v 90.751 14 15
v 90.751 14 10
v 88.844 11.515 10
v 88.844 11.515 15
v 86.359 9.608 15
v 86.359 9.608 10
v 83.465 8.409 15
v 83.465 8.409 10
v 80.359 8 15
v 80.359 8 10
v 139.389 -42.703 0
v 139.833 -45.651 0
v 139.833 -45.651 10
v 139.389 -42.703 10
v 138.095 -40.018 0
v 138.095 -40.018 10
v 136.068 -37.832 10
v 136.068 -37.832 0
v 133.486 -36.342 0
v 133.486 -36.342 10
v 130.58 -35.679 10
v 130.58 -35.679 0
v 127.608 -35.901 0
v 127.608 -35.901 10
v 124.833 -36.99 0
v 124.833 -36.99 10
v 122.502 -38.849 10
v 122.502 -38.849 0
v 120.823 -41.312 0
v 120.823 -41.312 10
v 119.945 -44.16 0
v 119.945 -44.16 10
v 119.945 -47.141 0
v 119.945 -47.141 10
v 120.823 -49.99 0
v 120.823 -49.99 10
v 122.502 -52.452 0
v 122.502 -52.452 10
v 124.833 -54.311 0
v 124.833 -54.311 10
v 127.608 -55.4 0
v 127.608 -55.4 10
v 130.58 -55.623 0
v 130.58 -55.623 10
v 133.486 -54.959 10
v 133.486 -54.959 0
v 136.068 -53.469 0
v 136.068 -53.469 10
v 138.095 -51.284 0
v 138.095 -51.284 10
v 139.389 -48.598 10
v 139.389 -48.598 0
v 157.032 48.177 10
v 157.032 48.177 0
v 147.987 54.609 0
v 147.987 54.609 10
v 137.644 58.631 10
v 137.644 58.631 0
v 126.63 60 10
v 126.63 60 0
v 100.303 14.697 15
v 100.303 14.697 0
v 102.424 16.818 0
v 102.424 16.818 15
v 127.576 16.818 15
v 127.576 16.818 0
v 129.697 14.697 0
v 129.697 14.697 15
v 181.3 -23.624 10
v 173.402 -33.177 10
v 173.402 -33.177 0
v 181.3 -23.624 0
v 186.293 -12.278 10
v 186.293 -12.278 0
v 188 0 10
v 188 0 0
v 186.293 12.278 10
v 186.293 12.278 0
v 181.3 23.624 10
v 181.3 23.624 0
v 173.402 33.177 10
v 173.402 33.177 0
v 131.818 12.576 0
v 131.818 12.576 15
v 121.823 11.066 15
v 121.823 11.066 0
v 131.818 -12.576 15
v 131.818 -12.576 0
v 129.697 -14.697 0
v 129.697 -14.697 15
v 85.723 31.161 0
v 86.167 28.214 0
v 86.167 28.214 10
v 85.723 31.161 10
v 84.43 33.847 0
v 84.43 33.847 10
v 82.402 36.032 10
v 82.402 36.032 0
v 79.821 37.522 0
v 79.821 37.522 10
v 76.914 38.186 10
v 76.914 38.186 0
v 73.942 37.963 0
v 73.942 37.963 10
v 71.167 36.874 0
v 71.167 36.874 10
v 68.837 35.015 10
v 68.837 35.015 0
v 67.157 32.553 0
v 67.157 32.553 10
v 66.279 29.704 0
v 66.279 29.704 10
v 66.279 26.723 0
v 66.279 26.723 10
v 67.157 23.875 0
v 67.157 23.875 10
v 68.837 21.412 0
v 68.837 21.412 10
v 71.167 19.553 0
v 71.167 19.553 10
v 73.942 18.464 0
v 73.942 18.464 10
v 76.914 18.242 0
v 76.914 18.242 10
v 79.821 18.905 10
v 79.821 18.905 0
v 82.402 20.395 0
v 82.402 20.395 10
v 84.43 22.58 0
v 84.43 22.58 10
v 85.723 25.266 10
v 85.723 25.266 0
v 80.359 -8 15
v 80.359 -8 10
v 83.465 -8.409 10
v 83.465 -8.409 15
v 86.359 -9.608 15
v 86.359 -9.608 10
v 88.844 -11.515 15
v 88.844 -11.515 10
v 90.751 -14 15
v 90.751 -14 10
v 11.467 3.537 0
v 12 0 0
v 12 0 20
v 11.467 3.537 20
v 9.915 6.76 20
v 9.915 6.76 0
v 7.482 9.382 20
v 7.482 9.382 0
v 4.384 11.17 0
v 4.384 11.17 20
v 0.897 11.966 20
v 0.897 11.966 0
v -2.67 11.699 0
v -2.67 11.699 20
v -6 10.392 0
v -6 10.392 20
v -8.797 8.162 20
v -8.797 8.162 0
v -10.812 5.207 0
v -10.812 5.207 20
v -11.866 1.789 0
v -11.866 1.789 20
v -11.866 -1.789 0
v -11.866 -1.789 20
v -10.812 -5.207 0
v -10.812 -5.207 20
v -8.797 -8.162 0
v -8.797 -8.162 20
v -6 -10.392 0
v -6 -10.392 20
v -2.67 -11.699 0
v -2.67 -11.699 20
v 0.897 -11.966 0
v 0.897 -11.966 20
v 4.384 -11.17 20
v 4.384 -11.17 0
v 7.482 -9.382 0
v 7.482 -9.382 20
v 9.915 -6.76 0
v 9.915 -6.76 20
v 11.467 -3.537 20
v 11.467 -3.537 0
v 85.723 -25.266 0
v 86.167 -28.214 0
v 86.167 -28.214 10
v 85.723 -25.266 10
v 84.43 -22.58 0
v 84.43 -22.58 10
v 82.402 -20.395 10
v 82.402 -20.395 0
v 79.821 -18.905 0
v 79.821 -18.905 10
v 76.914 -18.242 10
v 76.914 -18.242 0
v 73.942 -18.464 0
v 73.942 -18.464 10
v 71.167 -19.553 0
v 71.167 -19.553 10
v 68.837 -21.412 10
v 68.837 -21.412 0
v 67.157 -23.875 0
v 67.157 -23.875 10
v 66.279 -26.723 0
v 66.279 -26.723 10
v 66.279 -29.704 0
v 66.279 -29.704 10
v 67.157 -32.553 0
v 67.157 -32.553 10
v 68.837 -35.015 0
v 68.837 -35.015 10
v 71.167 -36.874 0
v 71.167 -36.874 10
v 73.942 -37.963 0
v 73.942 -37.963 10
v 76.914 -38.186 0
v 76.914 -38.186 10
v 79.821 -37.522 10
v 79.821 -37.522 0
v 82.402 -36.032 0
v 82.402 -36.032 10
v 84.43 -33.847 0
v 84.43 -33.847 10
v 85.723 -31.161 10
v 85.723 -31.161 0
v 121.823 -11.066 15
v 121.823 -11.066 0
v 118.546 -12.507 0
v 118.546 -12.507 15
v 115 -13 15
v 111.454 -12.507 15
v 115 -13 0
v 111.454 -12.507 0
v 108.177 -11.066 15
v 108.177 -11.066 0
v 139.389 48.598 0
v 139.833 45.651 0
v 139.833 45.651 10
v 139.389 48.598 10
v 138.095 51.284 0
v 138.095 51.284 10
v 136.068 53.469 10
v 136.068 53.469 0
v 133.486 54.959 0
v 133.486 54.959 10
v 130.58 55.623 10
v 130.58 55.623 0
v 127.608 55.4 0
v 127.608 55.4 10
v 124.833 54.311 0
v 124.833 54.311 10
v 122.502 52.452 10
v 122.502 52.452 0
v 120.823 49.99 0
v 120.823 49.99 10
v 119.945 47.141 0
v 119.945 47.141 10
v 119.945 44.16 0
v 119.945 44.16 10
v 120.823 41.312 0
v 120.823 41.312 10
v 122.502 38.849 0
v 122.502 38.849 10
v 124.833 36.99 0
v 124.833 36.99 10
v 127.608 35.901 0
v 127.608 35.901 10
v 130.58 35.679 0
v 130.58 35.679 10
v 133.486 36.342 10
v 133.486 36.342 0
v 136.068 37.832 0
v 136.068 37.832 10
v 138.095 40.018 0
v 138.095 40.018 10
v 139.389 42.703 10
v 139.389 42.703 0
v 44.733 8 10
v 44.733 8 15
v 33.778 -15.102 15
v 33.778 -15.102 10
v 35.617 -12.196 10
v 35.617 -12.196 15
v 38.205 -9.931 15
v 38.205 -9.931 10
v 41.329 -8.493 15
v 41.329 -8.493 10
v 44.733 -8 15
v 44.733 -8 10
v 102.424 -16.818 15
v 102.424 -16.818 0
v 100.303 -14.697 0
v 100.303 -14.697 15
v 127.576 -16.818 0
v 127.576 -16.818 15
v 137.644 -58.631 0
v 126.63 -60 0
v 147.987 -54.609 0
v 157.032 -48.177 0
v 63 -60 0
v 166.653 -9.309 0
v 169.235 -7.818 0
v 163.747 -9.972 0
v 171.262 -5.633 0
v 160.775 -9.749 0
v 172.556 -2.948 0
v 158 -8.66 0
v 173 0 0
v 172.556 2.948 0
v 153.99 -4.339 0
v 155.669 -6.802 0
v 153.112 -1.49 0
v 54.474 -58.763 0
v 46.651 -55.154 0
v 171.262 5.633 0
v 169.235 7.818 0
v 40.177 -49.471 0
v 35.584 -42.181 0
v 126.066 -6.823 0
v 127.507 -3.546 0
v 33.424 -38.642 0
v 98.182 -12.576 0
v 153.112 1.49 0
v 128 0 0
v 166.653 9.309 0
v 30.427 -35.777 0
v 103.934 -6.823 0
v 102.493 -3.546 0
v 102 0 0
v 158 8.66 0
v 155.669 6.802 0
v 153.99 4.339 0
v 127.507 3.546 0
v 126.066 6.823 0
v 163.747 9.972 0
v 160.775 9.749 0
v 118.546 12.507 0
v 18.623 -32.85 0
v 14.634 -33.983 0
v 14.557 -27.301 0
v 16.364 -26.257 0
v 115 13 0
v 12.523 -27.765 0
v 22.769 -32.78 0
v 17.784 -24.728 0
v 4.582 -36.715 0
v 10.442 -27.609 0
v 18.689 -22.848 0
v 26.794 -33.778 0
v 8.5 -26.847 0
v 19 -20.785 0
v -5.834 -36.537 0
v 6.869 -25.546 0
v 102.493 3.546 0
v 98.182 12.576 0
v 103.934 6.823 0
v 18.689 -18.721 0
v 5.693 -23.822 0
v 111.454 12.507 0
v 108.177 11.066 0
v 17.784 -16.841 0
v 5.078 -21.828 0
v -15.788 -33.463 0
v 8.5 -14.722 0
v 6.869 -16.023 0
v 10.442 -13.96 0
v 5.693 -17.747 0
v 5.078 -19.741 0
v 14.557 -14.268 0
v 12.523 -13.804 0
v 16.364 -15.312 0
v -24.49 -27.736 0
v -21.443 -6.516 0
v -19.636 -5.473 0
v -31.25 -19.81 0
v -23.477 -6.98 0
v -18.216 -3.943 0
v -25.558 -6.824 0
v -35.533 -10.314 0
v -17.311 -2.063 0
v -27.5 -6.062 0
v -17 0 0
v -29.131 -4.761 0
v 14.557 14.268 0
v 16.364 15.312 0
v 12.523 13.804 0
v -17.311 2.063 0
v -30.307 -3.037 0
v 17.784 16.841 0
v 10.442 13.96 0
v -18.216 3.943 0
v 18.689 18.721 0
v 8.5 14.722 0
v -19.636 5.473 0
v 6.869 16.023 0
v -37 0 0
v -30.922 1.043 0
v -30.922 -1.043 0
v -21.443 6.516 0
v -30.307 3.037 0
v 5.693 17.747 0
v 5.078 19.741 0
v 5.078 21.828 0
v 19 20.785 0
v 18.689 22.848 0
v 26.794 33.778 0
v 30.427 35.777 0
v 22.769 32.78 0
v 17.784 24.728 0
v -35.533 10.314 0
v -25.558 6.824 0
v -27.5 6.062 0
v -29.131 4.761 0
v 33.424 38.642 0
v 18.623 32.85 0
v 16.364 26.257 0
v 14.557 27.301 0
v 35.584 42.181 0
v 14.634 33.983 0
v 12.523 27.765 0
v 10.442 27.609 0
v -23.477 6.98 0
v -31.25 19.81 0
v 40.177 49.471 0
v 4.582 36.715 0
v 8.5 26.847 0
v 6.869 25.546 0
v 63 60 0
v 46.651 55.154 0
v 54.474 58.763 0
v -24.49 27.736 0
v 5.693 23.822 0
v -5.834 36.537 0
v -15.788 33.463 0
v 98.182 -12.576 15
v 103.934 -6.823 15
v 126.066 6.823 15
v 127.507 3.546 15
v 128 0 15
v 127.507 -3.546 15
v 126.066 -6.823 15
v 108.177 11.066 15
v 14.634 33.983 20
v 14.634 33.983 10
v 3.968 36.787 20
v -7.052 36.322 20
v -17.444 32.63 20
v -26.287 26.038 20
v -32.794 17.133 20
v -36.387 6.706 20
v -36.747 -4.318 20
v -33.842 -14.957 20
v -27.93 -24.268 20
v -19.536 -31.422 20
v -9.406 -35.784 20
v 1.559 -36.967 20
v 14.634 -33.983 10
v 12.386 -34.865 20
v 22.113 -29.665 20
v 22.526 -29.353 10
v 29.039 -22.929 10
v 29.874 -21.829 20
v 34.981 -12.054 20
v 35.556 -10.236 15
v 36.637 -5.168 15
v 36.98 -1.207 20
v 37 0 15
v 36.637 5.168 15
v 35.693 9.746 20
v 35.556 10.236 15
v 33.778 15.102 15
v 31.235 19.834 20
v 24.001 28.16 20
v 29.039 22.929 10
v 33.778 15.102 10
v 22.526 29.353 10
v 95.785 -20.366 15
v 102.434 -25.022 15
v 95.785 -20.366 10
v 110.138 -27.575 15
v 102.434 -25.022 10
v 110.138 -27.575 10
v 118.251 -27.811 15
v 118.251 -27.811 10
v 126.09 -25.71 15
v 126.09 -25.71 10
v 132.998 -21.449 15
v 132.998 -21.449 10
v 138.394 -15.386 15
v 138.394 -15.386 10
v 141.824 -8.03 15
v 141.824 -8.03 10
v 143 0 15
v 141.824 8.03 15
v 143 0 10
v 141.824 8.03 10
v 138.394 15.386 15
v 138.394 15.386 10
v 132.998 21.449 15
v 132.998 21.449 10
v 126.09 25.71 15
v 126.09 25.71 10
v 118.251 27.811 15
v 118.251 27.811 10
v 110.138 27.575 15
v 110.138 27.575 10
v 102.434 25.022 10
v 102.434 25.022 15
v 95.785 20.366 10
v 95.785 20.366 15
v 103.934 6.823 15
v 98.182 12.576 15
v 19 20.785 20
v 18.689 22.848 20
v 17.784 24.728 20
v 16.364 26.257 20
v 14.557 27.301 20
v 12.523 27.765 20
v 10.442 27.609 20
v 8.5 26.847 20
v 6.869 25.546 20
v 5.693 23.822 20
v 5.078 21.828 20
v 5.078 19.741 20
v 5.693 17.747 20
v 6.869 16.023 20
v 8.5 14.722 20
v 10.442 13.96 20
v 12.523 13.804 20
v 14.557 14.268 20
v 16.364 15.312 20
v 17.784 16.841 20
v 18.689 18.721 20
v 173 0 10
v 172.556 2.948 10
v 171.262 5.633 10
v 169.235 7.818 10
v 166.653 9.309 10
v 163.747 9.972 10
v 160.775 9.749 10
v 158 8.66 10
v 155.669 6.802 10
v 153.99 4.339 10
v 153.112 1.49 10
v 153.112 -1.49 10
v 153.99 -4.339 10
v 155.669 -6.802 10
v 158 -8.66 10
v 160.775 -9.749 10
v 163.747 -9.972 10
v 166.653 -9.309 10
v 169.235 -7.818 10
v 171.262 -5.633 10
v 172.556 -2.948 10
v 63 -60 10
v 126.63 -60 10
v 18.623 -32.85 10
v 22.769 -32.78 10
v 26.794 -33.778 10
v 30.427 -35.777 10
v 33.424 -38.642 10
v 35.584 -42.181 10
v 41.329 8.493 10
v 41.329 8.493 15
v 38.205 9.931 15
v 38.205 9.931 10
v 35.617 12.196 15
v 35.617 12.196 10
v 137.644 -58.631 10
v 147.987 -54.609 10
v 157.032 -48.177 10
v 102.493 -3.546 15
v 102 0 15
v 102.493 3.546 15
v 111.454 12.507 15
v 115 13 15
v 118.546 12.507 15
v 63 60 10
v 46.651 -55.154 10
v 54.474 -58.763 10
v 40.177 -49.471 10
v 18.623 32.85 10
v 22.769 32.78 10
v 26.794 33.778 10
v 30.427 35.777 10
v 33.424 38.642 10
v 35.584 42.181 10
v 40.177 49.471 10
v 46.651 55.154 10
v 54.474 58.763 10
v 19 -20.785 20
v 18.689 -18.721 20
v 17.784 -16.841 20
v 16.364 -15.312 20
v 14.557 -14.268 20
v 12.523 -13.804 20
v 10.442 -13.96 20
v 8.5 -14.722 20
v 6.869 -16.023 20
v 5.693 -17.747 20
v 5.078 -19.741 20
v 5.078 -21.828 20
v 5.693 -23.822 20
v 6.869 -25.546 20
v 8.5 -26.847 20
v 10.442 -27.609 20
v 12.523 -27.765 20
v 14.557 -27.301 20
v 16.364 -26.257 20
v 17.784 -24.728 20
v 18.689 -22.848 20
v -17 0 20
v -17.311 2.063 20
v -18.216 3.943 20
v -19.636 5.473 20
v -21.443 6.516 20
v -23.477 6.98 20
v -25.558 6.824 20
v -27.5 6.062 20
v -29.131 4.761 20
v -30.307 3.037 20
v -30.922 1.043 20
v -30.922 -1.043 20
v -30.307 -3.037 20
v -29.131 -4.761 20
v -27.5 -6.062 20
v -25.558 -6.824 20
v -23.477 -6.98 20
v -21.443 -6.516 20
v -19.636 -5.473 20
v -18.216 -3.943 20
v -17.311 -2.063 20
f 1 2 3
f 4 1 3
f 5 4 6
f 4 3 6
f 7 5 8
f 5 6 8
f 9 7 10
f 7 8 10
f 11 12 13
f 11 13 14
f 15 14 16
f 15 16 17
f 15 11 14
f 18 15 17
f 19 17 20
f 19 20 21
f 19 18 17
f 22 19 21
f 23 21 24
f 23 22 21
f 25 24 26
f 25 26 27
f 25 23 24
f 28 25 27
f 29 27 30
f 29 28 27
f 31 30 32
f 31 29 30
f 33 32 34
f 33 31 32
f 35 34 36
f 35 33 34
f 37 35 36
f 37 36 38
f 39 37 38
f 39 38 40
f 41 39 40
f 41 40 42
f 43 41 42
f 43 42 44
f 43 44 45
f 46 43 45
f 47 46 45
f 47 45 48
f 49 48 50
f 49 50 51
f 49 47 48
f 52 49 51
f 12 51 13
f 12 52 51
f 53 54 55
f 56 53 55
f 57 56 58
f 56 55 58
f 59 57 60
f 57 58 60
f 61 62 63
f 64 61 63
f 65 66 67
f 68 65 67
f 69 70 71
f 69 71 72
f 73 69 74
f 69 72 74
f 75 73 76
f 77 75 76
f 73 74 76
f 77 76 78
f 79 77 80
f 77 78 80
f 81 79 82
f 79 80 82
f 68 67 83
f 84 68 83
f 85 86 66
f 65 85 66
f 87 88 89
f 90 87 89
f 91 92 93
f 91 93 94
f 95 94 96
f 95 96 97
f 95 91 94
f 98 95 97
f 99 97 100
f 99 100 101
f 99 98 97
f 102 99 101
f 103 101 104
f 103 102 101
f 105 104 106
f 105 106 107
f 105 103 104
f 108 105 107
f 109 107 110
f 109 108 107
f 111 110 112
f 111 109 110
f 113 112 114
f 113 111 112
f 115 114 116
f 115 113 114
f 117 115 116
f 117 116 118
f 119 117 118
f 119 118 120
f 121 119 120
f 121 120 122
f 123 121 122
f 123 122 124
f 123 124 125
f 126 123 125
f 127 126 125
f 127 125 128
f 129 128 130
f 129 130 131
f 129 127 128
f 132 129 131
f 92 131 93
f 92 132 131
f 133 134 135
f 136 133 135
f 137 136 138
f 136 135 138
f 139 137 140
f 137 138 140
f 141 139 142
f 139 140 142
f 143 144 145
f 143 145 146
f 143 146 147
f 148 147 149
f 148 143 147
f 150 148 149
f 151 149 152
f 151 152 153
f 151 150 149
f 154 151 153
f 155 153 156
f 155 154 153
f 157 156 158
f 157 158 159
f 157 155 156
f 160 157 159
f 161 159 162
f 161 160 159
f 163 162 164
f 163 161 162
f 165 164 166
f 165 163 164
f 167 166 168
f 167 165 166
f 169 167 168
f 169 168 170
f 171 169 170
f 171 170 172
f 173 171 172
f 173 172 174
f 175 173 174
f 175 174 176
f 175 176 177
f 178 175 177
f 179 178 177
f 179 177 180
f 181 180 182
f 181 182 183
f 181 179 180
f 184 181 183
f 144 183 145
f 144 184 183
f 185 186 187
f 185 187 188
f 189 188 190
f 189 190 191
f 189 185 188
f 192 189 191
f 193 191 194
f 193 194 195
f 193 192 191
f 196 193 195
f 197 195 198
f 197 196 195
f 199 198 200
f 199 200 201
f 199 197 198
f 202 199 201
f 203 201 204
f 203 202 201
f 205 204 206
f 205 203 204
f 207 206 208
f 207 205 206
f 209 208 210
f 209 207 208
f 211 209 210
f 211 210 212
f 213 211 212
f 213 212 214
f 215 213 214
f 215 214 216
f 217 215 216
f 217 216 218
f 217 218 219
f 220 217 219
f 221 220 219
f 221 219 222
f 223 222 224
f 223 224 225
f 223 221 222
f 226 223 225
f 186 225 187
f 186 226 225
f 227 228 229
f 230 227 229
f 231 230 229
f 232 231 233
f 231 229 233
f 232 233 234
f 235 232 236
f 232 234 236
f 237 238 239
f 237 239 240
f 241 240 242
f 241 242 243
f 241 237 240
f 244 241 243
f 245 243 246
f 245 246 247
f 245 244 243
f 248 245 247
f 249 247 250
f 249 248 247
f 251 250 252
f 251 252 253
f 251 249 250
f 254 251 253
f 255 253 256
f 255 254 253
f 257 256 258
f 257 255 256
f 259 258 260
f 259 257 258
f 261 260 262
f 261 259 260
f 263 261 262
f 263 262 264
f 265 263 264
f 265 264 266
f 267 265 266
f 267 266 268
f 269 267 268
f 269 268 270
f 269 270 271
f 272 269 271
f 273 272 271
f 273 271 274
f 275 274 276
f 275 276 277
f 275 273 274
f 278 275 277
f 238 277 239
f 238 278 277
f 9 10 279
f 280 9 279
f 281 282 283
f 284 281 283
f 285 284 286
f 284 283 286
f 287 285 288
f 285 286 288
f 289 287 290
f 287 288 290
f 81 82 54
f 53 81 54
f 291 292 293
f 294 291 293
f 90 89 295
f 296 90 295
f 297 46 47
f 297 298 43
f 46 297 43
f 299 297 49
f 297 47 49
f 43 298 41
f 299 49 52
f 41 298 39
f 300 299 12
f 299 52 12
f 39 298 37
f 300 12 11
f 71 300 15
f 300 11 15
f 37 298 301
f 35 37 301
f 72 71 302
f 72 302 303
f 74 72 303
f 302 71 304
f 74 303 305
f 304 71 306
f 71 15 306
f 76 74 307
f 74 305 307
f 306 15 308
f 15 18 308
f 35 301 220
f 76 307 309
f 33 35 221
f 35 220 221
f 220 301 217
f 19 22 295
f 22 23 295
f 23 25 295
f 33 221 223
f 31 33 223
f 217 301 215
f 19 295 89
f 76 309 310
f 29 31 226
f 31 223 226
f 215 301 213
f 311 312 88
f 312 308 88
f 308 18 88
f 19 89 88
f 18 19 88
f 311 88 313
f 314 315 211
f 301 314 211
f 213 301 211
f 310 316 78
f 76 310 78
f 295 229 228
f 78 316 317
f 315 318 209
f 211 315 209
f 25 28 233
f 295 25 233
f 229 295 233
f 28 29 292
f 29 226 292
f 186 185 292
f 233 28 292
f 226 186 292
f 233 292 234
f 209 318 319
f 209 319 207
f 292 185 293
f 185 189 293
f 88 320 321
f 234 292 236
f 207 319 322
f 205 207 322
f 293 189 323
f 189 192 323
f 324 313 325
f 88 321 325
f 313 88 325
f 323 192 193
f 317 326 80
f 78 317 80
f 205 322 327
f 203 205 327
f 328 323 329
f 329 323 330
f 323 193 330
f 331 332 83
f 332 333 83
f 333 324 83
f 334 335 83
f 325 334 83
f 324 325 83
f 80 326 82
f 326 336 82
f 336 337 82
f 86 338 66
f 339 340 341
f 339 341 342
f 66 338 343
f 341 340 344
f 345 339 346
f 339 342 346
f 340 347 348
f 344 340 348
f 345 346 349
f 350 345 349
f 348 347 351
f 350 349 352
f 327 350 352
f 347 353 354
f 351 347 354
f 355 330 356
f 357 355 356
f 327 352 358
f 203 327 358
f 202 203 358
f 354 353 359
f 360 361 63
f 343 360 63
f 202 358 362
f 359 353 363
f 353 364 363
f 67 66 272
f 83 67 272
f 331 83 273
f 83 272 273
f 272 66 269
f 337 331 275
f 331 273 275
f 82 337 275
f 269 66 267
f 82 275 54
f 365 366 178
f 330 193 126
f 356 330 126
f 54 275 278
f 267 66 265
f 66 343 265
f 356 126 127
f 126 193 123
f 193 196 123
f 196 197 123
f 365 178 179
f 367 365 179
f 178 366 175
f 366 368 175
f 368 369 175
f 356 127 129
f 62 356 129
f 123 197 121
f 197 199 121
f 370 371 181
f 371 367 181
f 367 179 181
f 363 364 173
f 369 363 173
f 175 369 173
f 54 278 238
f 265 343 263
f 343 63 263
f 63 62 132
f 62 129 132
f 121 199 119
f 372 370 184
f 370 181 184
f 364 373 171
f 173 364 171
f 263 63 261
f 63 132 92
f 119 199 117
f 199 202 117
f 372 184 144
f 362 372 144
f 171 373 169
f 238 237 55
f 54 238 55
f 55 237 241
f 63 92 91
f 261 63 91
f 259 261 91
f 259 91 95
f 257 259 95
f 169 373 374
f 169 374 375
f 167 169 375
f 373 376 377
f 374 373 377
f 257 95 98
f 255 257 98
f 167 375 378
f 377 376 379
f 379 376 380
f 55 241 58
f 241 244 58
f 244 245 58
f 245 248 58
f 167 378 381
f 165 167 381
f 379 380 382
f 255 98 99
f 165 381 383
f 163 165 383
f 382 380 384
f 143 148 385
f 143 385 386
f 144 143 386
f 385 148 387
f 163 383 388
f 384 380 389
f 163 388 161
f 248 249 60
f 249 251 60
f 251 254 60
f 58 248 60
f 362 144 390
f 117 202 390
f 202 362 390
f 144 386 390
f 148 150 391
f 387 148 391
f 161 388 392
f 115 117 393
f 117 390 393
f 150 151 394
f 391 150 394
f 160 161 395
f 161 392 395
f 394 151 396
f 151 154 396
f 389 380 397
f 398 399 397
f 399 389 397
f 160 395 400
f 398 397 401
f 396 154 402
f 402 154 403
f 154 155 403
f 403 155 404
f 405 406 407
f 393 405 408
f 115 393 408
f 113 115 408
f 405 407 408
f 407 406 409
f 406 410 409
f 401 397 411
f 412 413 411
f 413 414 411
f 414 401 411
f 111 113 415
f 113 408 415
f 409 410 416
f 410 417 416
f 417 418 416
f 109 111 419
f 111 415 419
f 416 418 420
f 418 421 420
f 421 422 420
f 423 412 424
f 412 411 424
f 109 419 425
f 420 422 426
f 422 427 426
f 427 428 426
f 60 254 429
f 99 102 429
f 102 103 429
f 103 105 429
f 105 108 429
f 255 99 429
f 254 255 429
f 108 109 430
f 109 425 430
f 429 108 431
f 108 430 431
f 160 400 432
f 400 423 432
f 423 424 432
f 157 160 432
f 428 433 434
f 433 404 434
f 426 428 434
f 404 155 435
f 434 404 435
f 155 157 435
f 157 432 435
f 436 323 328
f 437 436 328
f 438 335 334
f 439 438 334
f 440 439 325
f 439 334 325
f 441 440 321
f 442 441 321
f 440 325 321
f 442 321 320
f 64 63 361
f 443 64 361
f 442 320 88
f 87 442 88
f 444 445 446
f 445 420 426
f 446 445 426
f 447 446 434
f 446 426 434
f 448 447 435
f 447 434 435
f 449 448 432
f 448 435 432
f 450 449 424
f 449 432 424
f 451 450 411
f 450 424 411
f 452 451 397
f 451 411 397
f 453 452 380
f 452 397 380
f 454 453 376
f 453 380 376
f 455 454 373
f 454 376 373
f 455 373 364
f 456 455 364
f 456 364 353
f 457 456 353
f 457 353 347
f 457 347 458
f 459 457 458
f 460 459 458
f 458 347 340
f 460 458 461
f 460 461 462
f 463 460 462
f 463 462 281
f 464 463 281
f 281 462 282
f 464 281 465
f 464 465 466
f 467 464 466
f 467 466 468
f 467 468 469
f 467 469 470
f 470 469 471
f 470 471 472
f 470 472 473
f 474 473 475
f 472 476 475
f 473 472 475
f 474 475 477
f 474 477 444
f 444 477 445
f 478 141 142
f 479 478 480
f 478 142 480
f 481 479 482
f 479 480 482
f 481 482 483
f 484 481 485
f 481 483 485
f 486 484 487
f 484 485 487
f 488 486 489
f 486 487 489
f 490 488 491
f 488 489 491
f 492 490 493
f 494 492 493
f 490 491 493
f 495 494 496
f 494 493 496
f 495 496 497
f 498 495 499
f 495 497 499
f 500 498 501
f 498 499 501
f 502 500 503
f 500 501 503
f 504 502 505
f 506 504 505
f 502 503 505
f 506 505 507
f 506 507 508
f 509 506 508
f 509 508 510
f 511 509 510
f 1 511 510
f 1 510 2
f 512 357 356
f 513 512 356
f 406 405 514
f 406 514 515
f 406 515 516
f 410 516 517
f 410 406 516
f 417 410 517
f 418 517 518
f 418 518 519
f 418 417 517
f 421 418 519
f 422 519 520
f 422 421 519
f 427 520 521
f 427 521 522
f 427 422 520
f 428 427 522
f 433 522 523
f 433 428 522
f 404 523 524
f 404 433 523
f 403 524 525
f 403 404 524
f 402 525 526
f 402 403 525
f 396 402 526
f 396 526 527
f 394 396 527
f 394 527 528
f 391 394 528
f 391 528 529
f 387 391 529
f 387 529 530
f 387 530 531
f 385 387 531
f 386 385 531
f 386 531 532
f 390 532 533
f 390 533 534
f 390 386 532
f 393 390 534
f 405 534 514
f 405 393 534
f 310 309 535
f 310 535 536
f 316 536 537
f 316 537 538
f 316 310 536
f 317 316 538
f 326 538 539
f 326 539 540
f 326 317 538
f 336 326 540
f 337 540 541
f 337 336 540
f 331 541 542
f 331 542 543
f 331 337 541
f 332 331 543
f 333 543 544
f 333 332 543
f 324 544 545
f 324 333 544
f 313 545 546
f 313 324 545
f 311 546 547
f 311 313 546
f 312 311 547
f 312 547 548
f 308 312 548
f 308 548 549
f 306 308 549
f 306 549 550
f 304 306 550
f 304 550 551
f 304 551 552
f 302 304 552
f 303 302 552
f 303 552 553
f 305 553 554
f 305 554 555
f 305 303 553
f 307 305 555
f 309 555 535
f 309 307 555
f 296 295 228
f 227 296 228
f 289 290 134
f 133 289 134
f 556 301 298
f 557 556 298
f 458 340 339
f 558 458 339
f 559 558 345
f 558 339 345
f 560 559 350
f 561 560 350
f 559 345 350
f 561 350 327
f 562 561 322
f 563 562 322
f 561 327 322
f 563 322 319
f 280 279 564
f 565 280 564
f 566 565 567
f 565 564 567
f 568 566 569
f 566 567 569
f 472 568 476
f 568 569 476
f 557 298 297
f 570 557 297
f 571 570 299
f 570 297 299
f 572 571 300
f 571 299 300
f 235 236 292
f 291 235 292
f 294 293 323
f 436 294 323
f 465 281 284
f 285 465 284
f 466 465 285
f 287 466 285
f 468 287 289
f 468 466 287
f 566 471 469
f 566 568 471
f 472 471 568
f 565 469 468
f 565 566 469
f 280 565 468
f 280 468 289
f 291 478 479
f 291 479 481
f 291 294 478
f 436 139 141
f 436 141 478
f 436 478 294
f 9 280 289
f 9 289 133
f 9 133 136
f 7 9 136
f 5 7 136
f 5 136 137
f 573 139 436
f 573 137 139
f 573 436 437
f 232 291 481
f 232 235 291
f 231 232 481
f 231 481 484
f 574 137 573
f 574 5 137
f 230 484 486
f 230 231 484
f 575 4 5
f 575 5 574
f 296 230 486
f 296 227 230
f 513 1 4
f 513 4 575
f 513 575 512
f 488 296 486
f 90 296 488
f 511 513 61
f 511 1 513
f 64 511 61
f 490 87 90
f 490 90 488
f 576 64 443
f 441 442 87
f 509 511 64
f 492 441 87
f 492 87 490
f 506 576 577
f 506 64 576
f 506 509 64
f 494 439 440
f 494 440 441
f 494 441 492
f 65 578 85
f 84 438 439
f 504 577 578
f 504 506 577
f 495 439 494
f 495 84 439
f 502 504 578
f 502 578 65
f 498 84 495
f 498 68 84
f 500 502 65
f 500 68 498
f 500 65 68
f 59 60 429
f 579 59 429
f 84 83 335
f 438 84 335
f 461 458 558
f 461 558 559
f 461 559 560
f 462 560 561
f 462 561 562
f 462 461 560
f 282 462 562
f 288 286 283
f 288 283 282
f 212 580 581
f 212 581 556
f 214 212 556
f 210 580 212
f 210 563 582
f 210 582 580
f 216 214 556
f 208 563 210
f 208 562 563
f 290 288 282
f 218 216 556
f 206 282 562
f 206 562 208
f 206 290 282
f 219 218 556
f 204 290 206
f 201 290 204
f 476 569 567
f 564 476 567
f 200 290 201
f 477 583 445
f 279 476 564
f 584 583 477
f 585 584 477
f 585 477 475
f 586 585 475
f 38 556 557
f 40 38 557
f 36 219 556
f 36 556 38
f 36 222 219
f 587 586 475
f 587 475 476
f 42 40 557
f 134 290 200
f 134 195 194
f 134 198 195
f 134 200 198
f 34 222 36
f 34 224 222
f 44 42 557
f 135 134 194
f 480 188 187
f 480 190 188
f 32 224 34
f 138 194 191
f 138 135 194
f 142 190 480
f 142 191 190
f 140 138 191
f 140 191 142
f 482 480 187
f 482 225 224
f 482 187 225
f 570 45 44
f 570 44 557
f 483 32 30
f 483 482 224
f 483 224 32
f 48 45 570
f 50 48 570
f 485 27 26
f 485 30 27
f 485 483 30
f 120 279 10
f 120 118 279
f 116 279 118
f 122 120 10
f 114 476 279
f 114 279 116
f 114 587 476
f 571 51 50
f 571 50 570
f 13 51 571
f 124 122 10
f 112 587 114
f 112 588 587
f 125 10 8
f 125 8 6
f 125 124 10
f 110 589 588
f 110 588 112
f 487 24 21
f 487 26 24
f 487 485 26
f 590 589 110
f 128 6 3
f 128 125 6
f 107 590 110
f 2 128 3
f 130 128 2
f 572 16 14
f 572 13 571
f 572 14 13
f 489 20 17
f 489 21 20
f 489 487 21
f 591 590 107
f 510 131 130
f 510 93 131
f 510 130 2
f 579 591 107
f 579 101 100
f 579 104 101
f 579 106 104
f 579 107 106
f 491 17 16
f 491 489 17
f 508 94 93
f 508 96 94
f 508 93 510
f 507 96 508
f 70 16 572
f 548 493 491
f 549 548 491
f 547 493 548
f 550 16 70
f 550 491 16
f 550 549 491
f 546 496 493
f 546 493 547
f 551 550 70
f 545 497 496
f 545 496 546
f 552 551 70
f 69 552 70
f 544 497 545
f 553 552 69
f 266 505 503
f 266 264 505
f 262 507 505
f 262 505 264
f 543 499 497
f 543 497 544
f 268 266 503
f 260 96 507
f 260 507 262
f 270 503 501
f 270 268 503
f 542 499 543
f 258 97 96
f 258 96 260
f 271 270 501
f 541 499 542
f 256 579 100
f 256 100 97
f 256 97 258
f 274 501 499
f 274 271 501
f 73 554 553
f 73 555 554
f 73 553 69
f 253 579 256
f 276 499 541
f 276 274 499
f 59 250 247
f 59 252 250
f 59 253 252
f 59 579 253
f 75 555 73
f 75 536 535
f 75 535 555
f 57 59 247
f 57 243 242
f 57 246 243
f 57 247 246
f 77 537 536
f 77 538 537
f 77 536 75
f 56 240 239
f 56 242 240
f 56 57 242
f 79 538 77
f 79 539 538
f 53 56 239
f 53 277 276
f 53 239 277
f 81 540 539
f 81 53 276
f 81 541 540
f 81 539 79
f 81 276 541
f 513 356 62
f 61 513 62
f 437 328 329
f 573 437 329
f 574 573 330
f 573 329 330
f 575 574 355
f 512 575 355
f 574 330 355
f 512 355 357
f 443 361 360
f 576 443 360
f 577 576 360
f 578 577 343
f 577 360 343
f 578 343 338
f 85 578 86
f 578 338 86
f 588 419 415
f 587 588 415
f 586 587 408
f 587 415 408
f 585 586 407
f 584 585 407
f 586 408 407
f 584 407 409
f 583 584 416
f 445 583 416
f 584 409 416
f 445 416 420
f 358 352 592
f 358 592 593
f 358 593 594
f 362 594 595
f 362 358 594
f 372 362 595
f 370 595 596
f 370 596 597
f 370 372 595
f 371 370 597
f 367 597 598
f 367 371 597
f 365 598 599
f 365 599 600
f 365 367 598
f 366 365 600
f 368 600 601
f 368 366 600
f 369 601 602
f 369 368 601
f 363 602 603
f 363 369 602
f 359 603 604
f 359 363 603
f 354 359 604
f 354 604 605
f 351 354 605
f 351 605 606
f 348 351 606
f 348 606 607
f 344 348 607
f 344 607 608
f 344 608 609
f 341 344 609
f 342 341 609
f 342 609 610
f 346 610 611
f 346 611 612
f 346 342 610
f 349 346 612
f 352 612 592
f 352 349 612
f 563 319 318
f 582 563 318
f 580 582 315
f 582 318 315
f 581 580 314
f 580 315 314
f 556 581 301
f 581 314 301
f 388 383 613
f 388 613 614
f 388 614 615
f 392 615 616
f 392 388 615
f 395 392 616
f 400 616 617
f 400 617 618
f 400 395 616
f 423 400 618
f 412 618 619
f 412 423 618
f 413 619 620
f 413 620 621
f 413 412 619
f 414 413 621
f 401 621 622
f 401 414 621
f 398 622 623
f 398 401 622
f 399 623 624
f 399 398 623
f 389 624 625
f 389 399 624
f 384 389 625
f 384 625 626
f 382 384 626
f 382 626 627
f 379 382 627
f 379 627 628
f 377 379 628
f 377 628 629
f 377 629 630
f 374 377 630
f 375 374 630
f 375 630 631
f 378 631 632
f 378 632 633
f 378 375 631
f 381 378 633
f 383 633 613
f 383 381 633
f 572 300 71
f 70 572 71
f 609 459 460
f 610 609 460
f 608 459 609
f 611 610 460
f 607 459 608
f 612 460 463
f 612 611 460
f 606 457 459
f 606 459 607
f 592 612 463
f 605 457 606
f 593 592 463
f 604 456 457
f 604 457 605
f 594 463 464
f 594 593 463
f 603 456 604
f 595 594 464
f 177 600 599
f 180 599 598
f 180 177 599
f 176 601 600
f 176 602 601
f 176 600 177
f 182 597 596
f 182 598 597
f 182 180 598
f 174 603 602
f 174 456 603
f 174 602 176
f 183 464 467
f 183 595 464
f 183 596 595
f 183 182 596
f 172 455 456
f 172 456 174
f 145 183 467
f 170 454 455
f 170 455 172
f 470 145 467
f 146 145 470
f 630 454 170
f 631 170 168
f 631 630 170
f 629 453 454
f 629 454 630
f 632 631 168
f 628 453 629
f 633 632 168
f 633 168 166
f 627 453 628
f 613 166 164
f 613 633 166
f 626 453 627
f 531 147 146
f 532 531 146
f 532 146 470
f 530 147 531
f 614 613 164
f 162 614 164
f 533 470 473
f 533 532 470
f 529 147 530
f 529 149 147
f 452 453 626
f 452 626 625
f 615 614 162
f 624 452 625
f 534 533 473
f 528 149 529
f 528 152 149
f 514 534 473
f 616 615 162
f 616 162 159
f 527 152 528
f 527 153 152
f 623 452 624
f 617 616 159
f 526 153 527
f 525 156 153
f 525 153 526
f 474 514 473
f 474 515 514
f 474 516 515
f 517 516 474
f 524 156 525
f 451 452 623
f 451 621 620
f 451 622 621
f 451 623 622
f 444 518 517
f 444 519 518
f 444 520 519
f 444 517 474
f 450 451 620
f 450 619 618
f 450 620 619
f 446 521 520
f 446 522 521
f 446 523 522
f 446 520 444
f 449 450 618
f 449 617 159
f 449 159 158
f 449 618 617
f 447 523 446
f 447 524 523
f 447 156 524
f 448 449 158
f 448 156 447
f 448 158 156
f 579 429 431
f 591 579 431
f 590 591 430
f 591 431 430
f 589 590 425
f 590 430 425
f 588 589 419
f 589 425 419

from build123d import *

# Parameters (mm, degrees)
SKETCH_1_R      = 10
EXTRUDE_1_DEPTH = 10
SKETCH_1_3_R    = 7
SKETCH_1_3_R_2  = 12
EXTRUDE_2_DEPTH = 20
EXTRUDE_3_DEPTH = 15


with BuildPart() as part:
    # Эскиз1 → Бобышка-Вытянуть1 (new body)
    with BuildSketch(Plane.XY):
        with BuildLine():
            ThreePointArc((33.777631107, 15.102040816), (38.204732973, 9.930851322), (44.732538493, 8))
            Line((44.732538493, 8), (80.358983849, 8))
            ThreePointArc((80.358983849, 8), (86.358983849, 9.607695155), (90.751288694, 14))
            ThreePointArc((90.751288694, 14), (143, 0), (90.751288694, -14))
            ThreePointArc((90.751288694, -14), (86.358983849, -9.607695155), (80.358983849, -8))
            Line((80.358983849, -8), (44.732538493, -8))
            ThreePointArc((44.732538493, -8), (38.204732973, -9.930851322), (33.777631107, -15.102040816))
            ThreePointArc((33.777631107, -15.102040816), (25.981771895, -26.342883843), (14.634400462, -33.982853369))
            ThreePointArc((14.634400462, -33.982853369), (26.793614992, -33.778427283), (35.584428164, -42.181396508))
            ThreePointArc((35.584428164, -42.181396508), (46.651328728, -55.153944971), (63, -60))
            Line((63, -60), (126.630372484, -60))
            ThreePointArc((126.630372484, -60), (142.940084207, -56.940354118), (157.031931827, -48.177480156))
            Line((157.031931827, -48.177480156), (173.401559343, -33.177480156))
            ThreePointArc((173.401559343, -33.177480156), (188, -1.233e-06), (173.401561161, 33.177478491))
            Line((173.401561161, 33.177478491), (157.031931827, 48.177480156))
            ThreePointArc((157.031931827, 48.177480156), (142.940084207, 56.940354118), (126.630372484, 60))
            Line((126.630372484, 60), (115, 60))
            Line((115, 60), (63, 60))
            ThreePointArc((63, 60), (46.651328728, 55.153944971), (35.584428164, 42.181396508))
            ThreePointArc((35.584428164, 42.181396508), (26.793614992, 33.778427283), (14.634400462, 33.982853369))
            ThreePointArc((14.634400462, 33.982853369), (25.981771895, 26.342883843), (33.777631107, 15.102040816))
        make_face()
        with Locations((129.83281573, -45.650712782)):
            Circle(SKETCH_1_R, mode=Mode.SUBTRACT)
        with Locations((76.16718427, -28.21369211)):
            Circle(SKETCH_1_R, mode=Mode.SUBTRACT)
        with Locations((163, 0)):
            Circle(SKETCH_1_R, mode=Mode.SUBTRACT)
        with Locations((76.16718427, 28.21369211)):
            Circle(SKETCH_1_R, mode=Mode.SUBTRACT)
        with Locations((129.83281573, 45.650712782)):
            Circle(SKETCH_1_R, mode=Mode.SUBTRACT)
    extrude(amount=EXTRUDE_1_DEPTH)

    # Эскиз1<3> → Бобышка-Вытянуть2 (add)
    with BuildSketch(Plane.XY):
        with BuildLine():
            ThreePointArc((37, 0), (36.185441485, 7.720998933), (33.777631107, 15.102040816))
            ThreePointArc((33.777631107, 15.102040816), (25.981771895, 26.342883843), (14.634400462, 33.982853369))
            ThreePointArc((14.634400462, 33.982853369), (-37, 0), (14.634400462, -33.982853369))
            ThreePointArc((14.634400462, -33.982853369), (25.981771895, -26.342883843), (33.777631107, -15.102040816))
            ThreePointArc((33.777631107, -15.102040816), (36.185441485, -7.720998933), (37, 0))
        make_face()
        with Locations((12, -20.784609691)):
            Circle(SKETCH_1_3_R, mode=Mode.SUBTRACT)
        with Locations((-24, 0)):
            Circle(SKETCH_1_3_R, mode=Mode.SUBTRACT)
        Circle(SKETCH_1_3_R_2, mode=Mode.SUBTRACT)
        with Locations((12, 20.784609691)):
            Circle(SKETCH_1_3_R, mode=Mode.SUBTRACT)
    extrude(amount=EXTRUDE_2_DEPTH)

    # Эскиз1<4> → Бобышка-Вытянуть3 (add)
    with BuildSketch(Plane.XY):
        with BuildLine():
            Line((80.358983849, 8), (44.732538493, 8))
            ThreePointArc((44.732538493, 8), (38.204732973, 9.930851322), (33.777631107, 15.102040816))
            ThreePointArc((33.777631107, 15.102040816), (36.185441485, 7.720998933), (37, 0))
            ThreePointArc((37, 0), (36.185441485, -7.720998933), (33.777631107, -15.102040816))
            ThreePointArc((33.777631107, -15.102040816), (38.204732973, -9.930851322), (44.732538493, -8))
            Line((44.732538493, -8), (80.358983849, -8))
            ThreePointArc((80.358983849, -8), (86.358983849, -9.607695155), (90.751288694, -14))
            ThreePointArc((90.751288694, -14), (143, 0), (90.751288694, 14))
            ThreePointArc((90.751288694, 14), (86.358983849, 9.607695155), (80.358983849, 8))
        make_face()
        with BuildLine():
            Line((98.1817412, 12.575618113), (100.303061543, 14.696938457))
            Line((100.303061543, 14.696938457), (102.424381887, 16.8182588))
            Line((102.424381887, 16.8182588), (108.177048434, 11.065592254))
            ThreePointArc((108.177048434, 11.065592254), (115, 13), (121.822951566, 11.065592254))
            Line((121.822951566, 11.065592254), (127.575618113, 16.8182588))
            Line((127.575618113, 16.8182588), (129.696938457, 14.696938457))
            Line((129.696938457, 14.696938457), (131.8182588, 12.575618113))
            Line((131.8182588, 12.575618113), (126.065592254, 6.822951566))
            ThreePointArc((126.065592254, 6.822951566), (128, 0), (126.065592254, -6.822951566))
            Line((126.065592254, -6.822951566), (131.8182588, -12.575618113))
            Line((131.8182588, -12.575618113), (129.696938457, -14.696938457))
            Line((129.696938457, -14.696938457), (127.575618113, -16.8182588))
            Line((127.575618113, -16.8182588), (121.822951566, -11.065592254))
            ThreePointArc((121.822951566, -11.065592254), (115, -13), (108.177048434, -11.065592254))
            Line((108.177048434, -11.065592254), (102.424381887, -16.8182588))
            Line((102.424381887, -16.8182588), (100.303061543, -14.696938457))
            Line((100.303061543, -14.696938457), (98.1817412, -12.575618113))
            Line((98.1817412, -12.575618113), (103.934407746, -6.822951566))
            ThreePointArc((103.934407746, -6.822951566), (102, 0), (103.934407746, 6.822951566))
            Line((103.934407746, 6.822951566), (98.1817412, 12.575618113))
        make_face(mode=Mode.SUBTRACT)
    extrude(amount=EXTRUDE_3_DEPTH)


solid = part.part
